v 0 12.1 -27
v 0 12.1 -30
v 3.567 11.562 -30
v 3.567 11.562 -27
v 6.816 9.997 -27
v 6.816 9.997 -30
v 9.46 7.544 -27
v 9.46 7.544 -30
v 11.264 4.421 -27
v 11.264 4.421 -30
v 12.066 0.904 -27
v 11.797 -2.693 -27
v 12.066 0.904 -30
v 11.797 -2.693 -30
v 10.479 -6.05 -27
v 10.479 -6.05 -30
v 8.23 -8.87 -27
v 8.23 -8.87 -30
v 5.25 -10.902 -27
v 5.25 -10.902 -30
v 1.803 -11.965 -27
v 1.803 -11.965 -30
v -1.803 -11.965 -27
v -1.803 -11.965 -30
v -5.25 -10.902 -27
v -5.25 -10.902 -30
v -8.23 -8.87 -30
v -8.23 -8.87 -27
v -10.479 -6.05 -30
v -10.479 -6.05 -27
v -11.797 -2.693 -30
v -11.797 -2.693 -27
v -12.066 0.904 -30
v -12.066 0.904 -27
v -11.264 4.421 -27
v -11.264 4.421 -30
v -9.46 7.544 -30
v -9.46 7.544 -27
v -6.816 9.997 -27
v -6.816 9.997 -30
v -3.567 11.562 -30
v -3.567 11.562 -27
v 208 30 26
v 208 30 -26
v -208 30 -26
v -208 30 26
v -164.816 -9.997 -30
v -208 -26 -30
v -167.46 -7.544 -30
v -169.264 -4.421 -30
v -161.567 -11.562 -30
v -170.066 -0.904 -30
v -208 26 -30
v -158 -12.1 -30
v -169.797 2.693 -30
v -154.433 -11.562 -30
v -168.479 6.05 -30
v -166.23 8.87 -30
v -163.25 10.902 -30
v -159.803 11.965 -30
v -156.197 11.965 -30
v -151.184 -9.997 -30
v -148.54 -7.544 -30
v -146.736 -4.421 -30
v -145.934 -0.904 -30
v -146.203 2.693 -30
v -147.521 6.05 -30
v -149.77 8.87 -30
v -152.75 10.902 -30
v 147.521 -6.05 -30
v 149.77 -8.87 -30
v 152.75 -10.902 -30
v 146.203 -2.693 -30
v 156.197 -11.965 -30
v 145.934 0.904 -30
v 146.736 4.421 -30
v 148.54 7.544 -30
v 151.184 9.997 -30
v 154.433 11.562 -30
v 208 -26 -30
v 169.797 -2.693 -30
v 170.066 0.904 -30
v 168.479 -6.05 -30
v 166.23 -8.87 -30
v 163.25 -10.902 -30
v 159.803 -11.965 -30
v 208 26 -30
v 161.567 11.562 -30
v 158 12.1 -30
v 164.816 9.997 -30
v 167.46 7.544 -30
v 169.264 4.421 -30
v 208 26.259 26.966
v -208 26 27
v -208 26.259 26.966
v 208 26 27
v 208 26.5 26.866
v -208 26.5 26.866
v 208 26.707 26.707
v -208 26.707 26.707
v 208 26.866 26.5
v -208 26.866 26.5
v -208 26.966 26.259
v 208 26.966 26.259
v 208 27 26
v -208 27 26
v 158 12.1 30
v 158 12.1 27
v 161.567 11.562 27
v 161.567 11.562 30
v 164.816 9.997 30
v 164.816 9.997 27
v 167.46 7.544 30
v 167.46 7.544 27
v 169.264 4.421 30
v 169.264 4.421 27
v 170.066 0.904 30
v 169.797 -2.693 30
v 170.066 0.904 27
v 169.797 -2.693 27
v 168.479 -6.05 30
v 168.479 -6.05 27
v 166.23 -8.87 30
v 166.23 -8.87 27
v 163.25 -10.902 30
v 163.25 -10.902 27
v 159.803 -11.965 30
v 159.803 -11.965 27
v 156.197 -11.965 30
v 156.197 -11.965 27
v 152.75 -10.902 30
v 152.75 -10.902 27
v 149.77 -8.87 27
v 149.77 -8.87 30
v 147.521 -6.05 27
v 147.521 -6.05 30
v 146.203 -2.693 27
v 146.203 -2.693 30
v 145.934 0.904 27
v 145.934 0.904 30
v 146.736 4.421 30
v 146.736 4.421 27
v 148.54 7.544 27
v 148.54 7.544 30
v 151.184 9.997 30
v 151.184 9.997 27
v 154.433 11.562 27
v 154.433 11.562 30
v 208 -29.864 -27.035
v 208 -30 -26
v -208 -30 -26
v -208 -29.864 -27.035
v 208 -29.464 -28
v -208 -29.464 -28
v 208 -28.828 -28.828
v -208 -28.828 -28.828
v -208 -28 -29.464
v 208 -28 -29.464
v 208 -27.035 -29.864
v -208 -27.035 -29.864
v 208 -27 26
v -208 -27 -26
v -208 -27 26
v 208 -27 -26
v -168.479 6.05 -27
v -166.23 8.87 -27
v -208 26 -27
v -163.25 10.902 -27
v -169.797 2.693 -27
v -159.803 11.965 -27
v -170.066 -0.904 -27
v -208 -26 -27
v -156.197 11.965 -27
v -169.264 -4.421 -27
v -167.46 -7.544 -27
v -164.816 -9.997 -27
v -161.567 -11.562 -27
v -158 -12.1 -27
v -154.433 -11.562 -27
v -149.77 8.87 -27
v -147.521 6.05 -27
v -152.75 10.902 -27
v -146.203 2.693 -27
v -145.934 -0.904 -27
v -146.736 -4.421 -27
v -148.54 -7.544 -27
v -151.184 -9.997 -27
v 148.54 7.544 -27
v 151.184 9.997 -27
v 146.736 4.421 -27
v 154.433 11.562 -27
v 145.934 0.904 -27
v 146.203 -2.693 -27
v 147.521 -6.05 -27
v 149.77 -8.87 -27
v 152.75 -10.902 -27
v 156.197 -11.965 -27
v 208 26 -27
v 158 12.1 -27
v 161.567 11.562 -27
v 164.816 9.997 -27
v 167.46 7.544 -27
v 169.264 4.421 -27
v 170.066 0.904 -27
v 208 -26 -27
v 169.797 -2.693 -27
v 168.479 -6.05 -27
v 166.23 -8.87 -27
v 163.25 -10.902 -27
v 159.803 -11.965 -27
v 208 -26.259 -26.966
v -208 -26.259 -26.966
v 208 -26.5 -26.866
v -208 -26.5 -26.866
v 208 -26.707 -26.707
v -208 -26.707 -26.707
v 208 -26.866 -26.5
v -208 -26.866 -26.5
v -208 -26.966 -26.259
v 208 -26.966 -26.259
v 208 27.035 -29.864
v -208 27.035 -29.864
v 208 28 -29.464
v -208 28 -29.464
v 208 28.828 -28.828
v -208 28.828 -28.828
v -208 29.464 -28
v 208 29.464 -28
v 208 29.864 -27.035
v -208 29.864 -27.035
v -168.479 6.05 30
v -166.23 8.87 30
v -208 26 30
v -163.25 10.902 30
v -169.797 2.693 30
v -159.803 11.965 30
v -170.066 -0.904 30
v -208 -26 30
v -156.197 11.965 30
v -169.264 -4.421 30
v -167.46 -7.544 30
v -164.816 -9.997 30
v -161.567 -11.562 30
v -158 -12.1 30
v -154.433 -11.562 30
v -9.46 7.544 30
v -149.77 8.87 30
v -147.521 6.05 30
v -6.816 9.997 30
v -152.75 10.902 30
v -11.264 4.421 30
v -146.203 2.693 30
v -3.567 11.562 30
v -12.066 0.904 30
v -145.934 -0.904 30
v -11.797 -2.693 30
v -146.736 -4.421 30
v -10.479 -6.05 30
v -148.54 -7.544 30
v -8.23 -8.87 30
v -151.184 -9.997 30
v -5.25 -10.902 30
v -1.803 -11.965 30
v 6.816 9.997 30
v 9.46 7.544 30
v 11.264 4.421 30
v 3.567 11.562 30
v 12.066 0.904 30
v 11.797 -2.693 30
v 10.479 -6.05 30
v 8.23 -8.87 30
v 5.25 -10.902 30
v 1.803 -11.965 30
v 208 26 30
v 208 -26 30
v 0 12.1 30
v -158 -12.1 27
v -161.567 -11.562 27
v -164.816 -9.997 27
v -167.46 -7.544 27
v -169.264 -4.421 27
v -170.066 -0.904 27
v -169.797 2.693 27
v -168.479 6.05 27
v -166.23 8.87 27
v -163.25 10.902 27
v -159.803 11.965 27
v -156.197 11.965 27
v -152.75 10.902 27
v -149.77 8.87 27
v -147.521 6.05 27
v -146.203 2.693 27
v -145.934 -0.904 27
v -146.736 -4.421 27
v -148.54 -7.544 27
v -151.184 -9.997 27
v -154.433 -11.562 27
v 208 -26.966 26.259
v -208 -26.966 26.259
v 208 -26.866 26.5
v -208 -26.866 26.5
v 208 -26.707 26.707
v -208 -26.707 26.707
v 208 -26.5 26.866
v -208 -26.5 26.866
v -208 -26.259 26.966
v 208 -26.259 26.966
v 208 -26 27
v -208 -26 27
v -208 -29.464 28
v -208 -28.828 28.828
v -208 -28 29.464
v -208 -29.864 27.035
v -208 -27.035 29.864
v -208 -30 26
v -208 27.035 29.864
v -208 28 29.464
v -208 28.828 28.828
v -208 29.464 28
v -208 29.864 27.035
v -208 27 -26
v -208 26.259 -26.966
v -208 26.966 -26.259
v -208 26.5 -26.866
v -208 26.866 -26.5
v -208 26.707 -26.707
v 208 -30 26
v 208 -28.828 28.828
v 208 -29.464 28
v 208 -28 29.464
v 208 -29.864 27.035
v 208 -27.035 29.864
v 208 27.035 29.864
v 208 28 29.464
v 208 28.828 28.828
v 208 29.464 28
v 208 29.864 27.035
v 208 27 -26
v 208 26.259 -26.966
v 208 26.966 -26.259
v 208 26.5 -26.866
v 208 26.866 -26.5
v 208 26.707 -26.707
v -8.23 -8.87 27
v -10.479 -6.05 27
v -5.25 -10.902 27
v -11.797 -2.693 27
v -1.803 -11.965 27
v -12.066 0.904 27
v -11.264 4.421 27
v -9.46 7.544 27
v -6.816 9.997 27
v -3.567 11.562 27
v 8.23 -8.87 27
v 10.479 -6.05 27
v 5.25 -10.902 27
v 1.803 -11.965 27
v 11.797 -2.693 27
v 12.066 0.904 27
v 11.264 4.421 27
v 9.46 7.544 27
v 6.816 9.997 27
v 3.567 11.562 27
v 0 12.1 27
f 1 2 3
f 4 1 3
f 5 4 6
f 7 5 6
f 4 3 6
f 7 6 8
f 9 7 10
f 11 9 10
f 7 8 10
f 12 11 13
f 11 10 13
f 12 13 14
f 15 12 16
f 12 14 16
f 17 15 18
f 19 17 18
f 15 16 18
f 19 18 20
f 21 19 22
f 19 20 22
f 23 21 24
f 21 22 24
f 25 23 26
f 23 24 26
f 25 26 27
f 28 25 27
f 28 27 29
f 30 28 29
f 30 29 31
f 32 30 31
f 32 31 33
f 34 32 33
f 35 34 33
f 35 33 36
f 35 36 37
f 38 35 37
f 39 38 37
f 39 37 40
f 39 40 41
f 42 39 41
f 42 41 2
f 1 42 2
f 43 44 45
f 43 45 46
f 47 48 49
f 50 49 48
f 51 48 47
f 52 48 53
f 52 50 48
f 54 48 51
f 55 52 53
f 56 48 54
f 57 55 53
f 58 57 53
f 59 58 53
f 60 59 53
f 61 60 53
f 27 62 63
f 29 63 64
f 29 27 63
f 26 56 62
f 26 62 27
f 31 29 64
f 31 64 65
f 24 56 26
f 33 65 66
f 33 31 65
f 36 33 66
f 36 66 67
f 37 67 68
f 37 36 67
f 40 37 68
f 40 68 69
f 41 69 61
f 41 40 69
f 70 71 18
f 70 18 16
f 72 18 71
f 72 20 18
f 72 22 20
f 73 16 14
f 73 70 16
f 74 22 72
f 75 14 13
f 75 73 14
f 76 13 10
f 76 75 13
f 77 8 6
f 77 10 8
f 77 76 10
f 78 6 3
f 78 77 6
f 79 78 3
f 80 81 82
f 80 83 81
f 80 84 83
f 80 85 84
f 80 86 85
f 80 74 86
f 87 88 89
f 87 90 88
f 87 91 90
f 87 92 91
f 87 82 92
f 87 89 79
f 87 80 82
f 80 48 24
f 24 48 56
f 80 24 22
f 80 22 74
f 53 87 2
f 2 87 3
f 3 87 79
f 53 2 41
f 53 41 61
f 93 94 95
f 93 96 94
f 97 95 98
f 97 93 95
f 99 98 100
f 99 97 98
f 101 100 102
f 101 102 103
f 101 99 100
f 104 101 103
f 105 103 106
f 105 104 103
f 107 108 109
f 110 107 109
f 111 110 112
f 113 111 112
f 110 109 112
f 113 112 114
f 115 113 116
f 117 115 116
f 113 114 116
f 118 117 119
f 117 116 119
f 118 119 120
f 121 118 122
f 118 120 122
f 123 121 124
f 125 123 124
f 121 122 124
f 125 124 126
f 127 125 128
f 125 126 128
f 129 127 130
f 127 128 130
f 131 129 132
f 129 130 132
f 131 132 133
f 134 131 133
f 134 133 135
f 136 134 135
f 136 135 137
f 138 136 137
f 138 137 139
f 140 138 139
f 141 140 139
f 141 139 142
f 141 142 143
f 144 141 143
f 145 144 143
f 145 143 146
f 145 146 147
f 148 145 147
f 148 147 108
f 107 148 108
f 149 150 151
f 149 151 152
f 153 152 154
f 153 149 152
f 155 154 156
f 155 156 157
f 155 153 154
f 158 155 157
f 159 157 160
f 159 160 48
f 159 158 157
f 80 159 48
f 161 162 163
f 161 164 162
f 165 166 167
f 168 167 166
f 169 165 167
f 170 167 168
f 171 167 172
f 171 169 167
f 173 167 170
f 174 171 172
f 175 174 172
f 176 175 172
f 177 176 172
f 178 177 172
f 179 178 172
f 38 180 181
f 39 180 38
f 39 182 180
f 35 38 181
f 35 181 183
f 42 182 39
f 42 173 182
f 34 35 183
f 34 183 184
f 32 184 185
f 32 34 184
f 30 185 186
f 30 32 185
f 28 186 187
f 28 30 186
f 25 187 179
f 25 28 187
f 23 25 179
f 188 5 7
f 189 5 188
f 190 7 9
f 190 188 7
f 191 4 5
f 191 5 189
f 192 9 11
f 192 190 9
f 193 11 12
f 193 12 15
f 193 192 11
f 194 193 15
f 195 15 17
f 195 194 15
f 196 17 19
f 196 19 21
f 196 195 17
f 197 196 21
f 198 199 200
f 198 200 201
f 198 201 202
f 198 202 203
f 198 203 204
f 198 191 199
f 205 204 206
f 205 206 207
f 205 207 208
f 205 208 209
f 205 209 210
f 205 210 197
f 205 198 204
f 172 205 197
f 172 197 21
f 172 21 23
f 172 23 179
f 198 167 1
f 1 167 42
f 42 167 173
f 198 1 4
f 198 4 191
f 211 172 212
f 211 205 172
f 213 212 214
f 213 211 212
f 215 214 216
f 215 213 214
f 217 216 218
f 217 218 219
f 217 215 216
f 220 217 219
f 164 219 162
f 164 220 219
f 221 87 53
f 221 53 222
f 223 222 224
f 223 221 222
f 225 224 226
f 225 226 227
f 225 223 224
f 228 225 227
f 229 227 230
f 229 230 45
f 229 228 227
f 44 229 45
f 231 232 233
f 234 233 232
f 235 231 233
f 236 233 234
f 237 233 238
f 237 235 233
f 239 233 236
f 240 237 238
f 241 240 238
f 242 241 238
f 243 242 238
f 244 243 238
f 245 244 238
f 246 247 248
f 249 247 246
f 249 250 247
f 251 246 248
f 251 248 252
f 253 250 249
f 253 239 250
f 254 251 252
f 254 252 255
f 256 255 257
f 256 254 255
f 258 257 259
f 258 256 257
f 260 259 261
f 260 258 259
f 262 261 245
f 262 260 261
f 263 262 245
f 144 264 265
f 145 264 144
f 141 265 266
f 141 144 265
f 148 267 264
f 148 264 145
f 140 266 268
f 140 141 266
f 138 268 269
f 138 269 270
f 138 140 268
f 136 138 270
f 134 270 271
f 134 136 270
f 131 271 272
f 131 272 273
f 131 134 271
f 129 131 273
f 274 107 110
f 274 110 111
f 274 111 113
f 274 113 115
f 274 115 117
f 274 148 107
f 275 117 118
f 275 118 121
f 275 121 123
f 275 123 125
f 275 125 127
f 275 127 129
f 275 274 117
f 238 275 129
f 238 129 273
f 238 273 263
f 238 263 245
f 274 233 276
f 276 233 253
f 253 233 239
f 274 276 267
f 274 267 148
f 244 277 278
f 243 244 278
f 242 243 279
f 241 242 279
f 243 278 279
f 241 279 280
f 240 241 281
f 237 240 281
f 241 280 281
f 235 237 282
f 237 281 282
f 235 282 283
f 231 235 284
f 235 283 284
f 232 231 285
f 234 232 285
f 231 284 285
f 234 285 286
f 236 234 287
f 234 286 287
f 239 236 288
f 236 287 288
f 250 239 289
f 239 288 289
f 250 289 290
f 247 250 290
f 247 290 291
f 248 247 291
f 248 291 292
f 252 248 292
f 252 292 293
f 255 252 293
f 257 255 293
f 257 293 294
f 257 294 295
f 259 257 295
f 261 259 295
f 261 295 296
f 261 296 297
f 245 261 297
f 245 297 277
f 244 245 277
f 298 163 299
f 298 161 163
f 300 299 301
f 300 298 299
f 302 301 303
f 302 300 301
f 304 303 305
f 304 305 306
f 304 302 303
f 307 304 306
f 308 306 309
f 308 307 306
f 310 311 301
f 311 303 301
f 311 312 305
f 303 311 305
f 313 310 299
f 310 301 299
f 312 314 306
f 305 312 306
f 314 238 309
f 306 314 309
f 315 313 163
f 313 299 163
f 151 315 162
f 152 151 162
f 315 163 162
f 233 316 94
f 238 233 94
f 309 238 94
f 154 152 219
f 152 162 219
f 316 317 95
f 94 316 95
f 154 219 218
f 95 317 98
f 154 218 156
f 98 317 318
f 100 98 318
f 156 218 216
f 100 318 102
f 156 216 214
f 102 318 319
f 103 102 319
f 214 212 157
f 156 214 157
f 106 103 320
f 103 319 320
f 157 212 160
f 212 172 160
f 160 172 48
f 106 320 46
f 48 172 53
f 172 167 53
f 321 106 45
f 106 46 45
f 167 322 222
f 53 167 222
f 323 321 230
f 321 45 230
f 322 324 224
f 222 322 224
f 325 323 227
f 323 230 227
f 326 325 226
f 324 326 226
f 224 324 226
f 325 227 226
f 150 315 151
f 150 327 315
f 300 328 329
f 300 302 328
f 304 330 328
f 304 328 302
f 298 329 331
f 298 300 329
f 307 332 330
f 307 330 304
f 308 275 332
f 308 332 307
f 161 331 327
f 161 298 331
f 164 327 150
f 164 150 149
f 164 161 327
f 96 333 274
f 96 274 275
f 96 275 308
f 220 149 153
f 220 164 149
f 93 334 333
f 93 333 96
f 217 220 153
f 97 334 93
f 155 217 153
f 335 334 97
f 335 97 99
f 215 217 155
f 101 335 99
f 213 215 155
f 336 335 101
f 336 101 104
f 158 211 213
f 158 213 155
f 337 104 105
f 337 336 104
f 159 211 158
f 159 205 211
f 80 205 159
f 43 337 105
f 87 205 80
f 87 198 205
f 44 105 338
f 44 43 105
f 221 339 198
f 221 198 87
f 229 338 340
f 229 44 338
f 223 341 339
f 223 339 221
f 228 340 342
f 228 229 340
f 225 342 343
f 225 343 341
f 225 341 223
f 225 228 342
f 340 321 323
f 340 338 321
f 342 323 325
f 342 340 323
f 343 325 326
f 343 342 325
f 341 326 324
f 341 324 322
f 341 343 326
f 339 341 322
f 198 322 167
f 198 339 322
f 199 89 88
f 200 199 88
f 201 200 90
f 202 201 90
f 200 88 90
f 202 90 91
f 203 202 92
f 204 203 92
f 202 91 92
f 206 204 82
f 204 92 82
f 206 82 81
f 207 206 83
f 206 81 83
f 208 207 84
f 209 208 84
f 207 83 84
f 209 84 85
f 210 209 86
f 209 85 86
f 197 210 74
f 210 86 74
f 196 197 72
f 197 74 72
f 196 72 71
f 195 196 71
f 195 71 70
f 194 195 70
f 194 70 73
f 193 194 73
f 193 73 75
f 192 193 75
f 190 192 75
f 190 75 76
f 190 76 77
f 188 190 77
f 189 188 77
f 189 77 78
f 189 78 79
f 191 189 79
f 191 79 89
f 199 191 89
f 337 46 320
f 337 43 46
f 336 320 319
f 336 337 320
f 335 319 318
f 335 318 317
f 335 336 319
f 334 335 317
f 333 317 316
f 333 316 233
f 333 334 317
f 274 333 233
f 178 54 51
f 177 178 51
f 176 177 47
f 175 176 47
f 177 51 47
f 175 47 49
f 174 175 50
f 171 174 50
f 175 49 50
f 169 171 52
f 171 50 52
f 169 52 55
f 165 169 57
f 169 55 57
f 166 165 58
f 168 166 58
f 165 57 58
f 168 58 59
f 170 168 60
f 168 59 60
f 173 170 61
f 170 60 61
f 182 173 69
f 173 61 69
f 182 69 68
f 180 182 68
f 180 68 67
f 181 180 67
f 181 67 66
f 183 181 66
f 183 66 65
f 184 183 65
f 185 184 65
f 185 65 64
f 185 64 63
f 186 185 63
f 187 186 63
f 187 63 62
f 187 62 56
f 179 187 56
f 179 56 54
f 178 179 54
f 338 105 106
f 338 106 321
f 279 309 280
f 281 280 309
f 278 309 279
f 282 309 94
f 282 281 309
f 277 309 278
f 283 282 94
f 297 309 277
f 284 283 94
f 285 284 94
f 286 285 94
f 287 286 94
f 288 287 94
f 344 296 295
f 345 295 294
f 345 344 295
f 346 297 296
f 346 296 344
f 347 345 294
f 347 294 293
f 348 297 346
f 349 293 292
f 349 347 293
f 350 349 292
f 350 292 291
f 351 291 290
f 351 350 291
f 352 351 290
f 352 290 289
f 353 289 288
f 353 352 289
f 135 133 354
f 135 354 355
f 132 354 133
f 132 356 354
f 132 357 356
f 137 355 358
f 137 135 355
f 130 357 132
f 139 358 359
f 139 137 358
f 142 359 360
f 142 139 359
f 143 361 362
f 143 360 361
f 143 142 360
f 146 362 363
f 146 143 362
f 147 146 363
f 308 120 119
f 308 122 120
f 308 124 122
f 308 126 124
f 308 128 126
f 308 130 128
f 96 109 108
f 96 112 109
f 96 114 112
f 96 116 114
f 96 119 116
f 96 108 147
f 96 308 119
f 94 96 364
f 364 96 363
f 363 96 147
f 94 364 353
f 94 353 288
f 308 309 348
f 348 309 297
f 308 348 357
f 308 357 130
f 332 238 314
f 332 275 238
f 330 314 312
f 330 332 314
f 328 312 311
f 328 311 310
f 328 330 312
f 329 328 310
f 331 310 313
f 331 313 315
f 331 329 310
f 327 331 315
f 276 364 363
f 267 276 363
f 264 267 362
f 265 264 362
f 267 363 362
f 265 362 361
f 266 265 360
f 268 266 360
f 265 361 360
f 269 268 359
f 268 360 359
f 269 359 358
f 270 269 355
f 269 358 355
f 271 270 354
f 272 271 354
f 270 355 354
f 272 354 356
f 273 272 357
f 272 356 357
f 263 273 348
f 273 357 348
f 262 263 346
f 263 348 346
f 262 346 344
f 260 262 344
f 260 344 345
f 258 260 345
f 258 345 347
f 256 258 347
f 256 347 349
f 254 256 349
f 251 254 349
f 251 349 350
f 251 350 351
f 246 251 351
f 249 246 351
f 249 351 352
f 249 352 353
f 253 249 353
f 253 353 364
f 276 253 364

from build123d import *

# Parameters (mm, degrees)
EXTRUDE_1_DEPTH     = 208
CUT_EXTRUDE_5_REACH = 220.55
SKETCH_10_R         = 12.1


with BuildPart() as part:
    # Эскиз1 → Бобышка-Вытянуть1 (new, symmetric)
    with BuildSketch(Plane(origin=(0, 0, 0), x_dir=(0, 0, -1), z_dir=(1, 0, 0))):
        with BuildLine():
            Line((-26, -30), (26, -30))
            ThreePointArc((26, -30), (28.828427125, -28.828427125), (30, -26))
            Line((30, -26), (30, 26))
            ThreePointArc((30, 26), (28.828427125, 28.828427125), (26, 30))
            Line((26, 30), (-26, 30))
            ThreePointArc((-26, 30), (-28.828427125, 28.828427125), (-30, 26))
            Line((-30, 26), (-30, -26))
            ThreePointArc((-30, -26), (-28.828427125, -28.828427125), (-26, -30))
        make_face()
        with BuildLine():
            Line((-26, 27), (26, 27))
            ThreePointArc((26, 27), (26.707106781, 26.707106781), (27, 26))
            Line((27, 26), (27, -26))
            ThreePointArc((27, -26), (26.707106781, -26.707106781), (26, -27))
            Line((26, -27), (-26, -27))
            ThreePointArc((-26, -27), (-26.707106781, -26.707106781), (-27, -26))
            Line((-27, -26), (-27, 26))
            ThreePointArc((-27, 26), (-26.707106781, 26.707106781), (-26, 27))
        make_face(mode=Mode.SUBTRACT)
    extrude(amount=EXTRUDE_1_DEPTH, both=True)

    # Вырез-Вытянуть5: up to this face of the body (flat: up to its plane)
    cut_extrude_5_end = Plane(part.part.faces().sort_by_distance((0, 0, 30))[0])
    # Эскиз10 → Вырез-Вытянуть5 (cut, up to the picked face)
    with BuildSketch(Plane(origin=(0, 0, -30), x_dir=(-1, 0, 0), z_dir=(0, 0, -1)), mode=Mode.PRIVATE) as cut_extrude_5_sk1:
        with Locations(Location((-158, 0, 0), (0, 0, 90))):
            Circle(SKETCH_10_R)
    cut_extrude_5_tool1 = split(extrude(cut_extrude_5_sk1.sketch, amount=-CUT_EXTRUDE_5_REACH, mode=Mode.PRIVATE), bisect_by=cut_extrude_5_end, keep=Keep.BOTH, mode=Mode.PRIVATE)
    # Эскиз10 → Вырез-Вытянуть5 (cut, up to the picked face)
    with BuildSketch(Plane(origin=(0, 0, -30), x_dir=(-1, 0, 0), z_dir=(0, 0, -1)), mode=Mode.PRIVATE) as cut_extrude_5_sk2:
        with Locations(Location((158, 0, 0), (0, 0, 270))):
            Circle(SKETCH_10_R)
    cut_extrude_5_tool2 = split(extrude(cut_extrude_5_sk2.sketch, amount=-CUT_EXTRUDE_5_REACH, mode=Mode.PRIVATE), bisect_by=cut_extrude_5_end, keep=Keep.BOTH, mode=Mode.PRIVATE)
    # Эскиз10 → Вырез-Вытянуть5 (cut, up to the picked face)
    with BuildSketch(Plane(origin=(0, 0, -30), x_dir=(-1, 0, 0), z_dir=(0, 0, -1)), mode=Mode.PRIVATE) as cut_extrude_5_sk3:
        with Locations(Location((0, 0, 0), (0, 0, 90))):
            Circle(SKETCH_10_R)
    cut_extrude_5_tool3 = split(extrude(cut_extrude_5_sk3.sketch, amount=-CUT_EXTRUDE_5_REACH, mode=Mode.PRIVATE), bisect_by=cut_extrude_5_end, keep=Keep.BOTH, mode=Mode.PRIVATE)
    add(cut_extrude_5_tool1.solids().sort_by(Axis((158, 0, -30), (0, 0, 1)))[0], mode=Mode.SUBTRACT)
    add(cut_extrude_5_tool2.solids().sort_by(Axis((-158, 0, -30), (0, 0, 1)))[0], mode=Mode.SUBTRACT)
    add(cut_extrude_5_tool3.solids().sort_by(Axis((0, 0, -30), (0, 0, 1)))[0], mode=Mode.SUBTRACT)


solid = part.part
